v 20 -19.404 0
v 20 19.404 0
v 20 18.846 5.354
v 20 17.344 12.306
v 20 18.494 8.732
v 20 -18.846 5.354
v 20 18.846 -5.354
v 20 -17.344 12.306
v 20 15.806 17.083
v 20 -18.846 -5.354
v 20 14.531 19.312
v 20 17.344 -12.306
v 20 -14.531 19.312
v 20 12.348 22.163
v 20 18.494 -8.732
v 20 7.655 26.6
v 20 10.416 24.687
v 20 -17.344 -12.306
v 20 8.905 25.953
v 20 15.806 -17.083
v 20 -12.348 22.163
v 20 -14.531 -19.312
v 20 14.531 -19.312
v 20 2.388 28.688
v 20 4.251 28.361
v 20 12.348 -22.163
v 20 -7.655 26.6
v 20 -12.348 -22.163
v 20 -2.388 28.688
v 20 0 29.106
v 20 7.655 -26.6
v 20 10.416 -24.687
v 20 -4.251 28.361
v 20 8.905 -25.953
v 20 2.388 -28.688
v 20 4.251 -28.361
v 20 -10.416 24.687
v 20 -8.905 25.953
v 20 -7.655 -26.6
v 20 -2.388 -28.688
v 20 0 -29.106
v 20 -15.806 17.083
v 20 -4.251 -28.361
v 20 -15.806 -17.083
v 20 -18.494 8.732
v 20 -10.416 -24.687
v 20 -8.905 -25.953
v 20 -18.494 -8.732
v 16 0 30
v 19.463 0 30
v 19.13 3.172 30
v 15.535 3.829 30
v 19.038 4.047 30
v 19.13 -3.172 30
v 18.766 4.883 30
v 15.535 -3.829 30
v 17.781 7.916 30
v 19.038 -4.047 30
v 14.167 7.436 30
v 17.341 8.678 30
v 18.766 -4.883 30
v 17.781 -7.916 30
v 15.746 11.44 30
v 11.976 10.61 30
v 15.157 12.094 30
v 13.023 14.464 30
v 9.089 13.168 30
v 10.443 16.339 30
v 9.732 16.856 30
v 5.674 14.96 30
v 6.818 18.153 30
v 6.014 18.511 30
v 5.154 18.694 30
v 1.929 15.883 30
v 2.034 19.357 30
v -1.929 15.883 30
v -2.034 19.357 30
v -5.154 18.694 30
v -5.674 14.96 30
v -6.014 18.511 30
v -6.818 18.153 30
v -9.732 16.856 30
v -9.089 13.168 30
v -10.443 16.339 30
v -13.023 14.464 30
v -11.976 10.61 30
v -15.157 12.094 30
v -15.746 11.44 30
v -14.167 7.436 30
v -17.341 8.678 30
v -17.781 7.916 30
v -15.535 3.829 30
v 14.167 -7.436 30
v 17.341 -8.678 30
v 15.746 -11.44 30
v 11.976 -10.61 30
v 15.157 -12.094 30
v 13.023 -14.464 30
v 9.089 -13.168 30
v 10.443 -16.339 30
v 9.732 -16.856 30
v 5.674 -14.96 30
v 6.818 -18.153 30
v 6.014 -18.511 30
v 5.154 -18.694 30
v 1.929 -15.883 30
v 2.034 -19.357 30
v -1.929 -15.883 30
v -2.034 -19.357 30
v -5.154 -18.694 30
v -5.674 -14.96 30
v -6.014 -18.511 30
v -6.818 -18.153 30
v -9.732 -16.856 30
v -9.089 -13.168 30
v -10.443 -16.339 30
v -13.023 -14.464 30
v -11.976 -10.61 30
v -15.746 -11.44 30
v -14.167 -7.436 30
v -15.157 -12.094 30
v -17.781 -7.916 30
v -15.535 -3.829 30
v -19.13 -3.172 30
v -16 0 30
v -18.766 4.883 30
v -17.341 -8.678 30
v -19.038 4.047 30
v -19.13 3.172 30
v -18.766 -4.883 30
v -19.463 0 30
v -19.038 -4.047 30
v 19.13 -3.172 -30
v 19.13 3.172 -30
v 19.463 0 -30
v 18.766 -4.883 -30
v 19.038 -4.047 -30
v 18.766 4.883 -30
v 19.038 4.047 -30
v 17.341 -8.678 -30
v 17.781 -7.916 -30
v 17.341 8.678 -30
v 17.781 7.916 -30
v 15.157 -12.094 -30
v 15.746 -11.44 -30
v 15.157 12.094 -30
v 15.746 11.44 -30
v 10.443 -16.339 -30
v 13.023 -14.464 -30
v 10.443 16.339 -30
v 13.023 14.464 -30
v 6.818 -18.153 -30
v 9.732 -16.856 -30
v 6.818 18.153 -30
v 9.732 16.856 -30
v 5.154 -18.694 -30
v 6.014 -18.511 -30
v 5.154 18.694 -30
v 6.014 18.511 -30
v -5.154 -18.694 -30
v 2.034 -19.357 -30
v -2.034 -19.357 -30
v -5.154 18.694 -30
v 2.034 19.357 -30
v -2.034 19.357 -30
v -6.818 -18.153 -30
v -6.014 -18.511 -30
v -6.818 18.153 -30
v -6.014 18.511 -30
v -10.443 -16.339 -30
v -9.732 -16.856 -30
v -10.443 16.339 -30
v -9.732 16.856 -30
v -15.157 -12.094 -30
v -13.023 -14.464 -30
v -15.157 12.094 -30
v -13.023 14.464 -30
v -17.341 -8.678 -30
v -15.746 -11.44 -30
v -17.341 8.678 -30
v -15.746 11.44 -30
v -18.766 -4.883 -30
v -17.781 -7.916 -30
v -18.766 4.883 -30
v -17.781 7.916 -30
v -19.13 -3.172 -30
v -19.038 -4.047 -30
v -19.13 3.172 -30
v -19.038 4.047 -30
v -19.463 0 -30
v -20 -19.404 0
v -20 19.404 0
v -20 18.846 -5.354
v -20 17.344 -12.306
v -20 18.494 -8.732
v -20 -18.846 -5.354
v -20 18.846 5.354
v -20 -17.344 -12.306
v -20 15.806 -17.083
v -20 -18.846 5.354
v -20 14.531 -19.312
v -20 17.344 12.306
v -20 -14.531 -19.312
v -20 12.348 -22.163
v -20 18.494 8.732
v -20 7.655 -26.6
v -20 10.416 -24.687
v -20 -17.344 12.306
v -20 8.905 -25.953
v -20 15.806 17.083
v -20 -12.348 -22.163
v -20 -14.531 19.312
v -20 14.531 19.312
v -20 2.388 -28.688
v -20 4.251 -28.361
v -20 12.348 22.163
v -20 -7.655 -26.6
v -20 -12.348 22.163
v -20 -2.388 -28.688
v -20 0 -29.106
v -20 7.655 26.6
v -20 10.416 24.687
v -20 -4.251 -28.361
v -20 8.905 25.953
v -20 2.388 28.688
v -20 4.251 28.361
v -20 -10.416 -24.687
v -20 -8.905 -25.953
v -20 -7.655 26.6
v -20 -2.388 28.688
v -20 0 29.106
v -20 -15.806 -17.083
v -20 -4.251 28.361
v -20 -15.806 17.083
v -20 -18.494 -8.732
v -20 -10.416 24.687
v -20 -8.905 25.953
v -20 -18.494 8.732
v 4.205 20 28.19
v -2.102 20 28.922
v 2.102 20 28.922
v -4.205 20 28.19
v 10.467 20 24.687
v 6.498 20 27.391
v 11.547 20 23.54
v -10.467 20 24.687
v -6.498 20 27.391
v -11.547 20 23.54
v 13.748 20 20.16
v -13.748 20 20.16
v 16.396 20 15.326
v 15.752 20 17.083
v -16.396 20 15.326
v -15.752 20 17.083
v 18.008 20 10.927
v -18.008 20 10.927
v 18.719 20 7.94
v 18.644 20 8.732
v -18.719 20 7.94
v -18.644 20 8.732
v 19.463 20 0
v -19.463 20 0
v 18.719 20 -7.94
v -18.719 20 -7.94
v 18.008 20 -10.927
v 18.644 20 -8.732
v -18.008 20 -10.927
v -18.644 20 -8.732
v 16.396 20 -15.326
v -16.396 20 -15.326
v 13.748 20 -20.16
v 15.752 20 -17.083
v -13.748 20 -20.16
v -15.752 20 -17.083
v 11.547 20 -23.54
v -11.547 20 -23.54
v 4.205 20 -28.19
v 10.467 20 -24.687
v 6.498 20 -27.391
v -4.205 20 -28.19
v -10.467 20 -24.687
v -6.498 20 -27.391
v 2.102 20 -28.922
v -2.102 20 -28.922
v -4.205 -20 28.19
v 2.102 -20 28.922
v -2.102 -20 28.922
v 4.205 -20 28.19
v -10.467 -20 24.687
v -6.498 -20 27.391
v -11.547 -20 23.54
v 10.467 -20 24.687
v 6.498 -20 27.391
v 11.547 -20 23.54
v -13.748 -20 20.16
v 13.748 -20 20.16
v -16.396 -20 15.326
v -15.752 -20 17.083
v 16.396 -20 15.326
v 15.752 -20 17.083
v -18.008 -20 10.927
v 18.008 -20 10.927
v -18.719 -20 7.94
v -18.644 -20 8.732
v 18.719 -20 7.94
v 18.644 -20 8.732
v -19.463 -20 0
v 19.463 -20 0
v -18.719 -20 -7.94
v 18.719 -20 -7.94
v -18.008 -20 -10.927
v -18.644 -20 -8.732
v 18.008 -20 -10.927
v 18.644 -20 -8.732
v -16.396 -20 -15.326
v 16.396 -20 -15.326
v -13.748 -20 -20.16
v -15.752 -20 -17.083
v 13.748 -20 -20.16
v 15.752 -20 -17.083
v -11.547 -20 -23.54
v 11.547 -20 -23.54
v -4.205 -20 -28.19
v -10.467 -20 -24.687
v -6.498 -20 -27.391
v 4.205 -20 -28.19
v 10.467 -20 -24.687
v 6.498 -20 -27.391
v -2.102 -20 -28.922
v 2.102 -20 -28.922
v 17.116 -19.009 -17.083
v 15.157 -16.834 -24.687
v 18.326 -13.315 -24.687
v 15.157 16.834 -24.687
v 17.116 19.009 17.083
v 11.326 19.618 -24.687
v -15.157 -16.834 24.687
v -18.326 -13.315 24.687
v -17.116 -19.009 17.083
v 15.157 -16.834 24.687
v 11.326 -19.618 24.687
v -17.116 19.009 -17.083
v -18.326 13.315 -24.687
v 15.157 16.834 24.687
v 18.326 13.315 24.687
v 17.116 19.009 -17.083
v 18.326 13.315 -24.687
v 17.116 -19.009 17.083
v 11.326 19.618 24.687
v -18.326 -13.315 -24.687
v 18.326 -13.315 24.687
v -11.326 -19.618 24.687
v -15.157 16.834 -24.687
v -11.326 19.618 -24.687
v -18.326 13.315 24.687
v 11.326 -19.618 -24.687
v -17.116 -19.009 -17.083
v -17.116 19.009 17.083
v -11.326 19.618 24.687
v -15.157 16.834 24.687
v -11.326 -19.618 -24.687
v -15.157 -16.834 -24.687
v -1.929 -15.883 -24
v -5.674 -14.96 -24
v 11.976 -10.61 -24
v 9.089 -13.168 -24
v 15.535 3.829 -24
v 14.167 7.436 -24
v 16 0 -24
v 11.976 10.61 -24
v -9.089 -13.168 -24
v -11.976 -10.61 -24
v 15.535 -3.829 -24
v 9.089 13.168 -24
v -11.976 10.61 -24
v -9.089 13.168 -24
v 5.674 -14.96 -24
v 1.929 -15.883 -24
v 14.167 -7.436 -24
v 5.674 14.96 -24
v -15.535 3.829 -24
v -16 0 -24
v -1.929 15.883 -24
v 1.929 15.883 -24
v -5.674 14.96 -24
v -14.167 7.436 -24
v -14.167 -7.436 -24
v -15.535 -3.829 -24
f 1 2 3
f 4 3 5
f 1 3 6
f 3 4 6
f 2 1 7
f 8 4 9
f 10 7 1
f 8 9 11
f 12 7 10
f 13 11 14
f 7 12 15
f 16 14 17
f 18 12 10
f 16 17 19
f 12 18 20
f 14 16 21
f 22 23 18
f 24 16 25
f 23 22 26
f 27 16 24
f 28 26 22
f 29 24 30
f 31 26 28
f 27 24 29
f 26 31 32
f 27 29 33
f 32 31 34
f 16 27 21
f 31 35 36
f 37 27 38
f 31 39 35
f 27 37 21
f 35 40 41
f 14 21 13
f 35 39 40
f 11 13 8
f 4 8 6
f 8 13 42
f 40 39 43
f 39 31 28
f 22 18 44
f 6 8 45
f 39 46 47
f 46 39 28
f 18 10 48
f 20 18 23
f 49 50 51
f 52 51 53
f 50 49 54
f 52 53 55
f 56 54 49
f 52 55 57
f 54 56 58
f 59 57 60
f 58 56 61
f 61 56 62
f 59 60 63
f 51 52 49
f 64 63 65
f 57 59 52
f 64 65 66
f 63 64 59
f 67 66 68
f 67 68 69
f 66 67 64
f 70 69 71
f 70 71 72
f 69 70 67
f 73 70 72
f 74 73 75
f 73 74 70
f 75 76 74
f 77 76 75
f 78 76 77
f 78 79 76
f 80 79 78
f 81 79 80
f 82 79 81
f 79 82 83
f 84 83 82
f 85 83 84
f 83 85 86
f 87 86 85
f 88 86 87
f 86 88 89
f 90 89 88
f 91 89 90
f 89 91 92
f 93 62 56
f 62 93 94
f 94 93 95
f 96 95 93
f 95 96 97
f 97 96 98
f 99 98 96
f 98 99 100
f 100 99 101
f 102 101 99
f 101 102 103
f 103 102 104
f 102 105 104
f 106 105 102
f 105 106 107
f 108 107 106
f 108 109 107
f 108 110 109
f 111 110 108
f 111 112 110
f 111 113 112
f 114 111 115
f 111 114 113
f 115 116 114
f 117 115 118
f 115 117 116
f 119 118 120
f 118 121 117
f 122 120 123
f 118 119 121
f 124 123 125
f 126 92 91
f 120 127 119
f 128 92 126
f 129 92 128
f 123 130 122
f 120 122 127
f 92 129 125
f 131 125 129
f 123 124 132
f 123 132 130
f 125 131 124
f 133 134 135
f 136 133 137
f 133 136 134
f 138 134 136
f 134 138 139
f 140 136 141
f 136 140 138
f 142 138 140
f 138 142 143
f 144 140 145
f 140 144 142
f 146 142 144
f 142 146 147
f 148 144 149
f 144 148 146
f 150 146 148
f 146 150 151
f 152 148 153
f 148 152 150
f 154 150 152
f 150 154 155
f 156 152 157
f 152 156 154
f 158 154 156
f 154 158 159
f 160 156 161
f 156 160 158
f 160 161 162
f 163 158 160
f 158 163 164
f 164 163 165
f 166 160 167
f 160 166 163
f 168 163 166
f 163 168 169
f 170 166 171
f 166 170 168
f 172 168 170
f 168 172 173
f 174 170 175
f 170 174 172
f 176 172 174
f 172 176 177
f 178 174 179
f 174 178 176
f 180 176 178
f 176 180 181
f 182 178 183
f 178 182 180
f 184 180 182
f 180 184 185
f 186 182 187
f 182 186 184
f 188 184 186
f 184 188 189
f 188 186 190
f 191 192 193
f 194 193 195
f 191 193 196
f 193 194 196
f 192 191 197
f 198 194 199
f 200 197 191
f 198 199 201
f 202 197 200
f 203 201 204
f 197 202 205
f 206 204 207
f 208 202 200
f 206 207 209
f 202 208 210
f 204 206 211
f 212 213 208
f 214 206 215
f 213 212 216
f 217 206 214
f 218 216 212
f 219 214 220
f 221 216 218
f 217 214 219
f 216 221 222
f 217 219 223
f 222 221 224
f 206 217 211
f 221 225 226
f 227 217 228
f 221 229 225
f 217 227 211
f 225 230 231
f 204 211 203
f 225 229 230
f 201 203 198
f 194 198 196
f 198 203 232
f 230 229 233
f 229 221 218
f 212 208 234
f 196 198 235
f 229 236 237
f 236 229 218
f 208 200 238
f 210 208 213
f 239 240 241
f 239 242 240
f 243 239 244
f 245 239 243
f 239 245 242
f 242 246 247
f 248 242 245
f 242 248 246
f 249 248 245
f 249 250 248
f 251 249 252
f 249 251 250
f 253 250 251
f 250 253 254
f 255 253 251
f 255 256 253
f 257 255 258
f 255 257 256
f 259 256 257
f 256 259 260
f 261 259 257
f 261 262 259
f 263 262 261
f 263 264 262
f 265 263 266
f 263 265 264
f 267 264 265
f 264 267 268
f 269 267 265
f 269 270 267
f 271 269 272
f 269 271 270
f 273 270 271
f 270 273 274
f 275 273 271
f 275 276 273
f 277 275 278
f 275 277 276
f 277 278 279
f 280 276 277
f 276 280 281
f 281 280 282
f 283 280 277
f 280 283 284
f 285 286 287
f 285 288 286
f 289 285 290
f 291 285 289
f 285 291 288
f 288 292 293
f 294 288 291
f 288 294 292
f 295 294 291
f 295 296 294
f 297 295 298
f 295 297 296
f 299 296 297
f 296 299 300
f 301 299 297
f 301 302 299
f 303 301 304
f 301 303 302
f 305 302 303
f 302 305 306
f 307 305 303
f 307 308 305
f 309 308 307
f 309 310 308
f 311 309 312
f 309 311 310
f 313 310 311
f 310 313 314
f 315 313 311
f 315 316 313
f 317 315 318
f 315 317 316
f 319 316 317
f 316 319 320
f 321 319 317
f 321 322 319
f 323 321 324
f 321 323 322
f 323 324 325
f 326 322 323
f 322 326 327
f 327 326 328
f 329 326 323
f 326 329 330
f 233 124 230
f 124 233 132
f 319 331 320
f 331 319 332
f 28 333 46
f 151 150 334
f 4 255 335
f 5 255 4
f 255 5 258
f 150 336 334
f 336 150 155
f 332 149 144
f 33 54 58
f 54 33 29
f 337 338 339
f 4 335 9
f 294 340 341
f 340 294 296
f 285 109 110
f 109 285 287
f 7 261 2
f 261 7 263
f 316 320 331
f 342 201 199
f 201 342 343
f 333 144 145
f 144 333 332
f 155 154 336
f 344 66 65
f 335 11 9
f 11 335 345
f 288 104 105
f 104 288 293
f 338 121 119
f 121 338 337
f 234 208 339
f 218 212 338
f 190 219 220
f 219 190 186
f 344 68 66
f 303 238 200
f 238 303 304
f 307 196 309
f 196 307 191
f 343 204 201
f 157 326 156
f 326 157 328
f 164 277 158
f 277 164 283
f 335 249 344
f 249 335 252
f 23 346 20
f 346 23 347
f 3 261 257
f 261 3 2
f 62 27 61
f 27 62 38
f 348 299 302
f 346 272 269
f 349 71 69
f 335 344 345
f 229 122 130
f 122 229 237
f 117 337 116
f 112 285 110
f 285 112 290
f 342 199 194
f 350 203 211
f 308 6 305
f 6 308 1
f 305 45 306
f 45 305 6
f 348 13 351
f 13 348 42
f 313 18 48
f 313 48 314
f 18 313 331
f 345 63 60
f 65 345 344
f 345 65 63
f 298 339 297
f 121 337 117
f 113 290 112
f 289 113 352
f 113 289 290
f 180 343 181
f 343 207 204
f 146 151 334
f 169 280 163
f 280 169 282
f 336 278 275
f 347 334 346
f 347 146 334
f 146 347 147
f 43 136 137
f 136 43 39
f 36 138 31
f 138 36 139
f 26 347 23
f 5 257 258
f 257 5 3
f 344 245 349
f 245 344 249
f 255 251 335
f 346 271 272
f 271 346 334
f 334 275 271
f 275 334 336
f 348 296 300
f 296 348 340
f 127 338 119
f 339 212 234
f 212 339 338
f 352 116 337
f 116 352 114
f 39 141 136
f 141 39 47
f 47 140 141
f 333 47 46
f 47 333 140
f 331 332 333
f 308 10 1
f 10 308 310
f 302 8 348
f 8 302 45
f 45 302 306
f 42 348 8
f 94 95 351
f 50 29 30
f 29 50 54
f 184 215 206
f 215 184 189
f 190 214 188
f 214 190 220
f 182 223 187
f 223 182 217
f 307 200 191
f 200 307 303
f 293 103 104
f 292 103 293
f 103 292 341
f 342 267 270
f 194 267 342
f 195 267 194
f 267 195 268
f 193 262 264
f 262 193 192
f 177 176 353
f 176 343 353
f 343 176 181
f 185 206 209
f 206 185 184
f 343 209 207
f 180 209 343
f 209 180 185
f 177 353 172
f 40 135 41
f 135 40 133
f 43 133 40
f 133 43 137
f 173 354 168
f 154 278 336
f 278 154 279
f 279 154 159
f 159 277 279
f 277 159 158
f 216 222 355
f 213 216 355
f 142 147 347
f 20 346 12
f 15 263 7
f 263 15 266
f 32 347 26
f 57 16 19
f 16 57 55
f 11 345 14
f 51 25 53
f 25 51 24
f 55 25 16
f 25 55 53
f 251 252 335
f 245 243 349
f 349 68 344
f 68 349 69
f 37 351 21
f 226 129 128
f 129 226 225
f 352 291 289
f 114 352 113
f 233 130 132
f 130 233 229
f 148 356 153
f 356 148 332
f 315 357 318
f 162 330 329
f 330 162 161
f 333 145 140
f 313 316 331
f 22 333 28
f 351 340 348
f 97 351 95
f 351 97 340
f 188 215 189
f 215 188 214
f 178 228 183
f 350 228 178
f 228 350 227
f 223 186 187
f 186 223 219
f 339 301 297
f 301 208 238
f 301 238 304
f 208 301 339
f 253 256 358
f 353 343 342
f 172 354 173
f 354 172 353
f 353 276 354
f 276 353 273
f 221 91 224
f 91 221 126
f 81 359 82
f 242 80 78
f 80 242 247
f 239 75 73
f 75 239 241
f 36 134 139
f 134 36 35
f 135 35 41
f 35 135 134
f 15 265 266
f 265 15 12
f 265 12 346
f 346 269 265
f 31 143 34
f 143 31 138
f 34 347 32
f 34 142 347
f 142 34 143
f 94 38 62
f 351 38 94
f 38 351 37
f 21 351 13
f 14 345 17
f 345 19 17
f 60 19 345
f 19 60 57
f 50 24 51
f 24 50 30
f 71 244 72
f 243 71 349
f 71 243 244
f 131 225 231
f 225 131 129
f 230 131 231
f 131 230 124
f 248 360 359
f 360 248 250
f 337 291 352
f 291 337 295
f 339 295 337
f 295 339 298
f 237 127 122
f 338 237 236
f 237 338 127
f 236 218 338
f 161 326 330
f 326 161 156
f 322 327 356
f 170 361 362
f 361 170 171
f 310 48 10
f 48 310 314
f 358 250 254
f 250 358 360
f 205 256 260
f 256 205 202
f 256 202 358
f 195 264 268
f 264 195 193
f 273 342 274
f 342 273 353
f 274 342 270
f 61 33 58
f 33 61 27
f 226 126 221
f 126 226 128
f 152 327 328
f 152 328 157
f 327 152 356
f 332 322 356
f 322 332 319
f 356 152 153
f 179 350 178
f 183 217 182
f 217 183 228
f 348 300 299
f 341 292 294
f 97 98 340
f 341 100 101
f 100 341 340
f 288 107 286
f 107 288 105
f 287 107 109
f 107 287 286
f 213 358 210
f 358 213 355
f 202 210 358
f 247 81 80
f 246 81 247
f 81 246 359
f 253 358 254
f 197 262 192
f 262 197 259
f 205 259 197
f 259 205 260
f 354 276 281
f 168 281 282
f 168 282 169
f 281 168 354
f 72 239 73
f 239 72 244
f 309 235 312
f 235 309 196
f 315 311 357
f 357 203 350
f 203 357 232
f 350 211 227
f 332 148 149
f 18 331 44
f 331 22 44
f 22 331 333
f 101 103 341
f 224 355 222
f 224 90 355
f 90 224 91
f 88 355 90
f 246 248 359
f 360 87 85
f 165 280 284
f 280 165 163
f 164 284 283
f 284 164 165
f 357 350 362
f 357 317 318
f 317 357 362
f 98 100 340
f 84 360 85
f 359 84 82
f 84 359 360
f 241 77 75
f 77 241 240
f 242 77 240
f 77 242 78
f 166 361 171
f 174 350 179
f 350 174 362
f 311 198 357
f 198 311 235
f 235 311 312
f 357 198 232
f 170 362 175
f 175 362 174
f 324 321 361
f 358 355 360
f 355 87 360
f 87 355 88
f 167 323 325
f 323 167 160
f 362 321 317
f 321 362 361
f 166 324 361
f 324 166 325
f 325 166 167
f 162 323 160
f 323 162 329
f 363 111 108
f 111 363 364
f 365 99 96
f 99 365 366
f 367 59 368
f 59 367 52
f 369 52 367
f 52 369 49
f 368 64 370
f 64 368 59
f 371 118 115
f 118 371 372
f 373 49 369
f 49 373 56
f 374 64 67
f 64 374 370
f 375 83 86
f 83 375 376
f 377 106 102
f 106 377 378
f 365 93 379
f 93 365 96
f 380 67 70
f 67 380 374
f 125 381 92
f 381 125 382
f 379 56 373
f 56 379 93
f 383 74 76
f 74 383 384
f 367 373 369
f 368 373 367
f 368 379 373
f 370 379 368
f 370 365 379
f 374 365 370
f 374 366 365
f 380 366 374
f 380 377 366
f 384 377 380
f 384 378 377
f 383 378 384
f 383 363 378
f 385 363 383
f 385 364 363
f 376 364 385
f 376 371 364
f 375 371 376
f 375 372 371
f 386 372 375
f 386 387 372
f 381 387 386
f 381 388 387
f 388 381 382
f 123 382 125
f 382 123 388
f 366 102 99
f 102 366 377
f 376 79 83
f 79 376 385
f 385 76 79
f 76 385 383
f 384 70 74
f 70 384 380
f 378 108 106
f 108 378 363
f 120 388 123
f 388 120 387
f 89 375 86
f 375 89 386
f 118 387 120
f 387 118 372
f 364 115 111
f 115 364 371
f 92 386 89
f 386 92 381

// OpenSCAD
scale([2,2,3]) {
    difference() {
        intersection() {
          cube([20,20,20], center=true);
          sphere(14);
        }
        translate([0,0,-8]) 
            cylinder(r=8,h=22);
    }
}
